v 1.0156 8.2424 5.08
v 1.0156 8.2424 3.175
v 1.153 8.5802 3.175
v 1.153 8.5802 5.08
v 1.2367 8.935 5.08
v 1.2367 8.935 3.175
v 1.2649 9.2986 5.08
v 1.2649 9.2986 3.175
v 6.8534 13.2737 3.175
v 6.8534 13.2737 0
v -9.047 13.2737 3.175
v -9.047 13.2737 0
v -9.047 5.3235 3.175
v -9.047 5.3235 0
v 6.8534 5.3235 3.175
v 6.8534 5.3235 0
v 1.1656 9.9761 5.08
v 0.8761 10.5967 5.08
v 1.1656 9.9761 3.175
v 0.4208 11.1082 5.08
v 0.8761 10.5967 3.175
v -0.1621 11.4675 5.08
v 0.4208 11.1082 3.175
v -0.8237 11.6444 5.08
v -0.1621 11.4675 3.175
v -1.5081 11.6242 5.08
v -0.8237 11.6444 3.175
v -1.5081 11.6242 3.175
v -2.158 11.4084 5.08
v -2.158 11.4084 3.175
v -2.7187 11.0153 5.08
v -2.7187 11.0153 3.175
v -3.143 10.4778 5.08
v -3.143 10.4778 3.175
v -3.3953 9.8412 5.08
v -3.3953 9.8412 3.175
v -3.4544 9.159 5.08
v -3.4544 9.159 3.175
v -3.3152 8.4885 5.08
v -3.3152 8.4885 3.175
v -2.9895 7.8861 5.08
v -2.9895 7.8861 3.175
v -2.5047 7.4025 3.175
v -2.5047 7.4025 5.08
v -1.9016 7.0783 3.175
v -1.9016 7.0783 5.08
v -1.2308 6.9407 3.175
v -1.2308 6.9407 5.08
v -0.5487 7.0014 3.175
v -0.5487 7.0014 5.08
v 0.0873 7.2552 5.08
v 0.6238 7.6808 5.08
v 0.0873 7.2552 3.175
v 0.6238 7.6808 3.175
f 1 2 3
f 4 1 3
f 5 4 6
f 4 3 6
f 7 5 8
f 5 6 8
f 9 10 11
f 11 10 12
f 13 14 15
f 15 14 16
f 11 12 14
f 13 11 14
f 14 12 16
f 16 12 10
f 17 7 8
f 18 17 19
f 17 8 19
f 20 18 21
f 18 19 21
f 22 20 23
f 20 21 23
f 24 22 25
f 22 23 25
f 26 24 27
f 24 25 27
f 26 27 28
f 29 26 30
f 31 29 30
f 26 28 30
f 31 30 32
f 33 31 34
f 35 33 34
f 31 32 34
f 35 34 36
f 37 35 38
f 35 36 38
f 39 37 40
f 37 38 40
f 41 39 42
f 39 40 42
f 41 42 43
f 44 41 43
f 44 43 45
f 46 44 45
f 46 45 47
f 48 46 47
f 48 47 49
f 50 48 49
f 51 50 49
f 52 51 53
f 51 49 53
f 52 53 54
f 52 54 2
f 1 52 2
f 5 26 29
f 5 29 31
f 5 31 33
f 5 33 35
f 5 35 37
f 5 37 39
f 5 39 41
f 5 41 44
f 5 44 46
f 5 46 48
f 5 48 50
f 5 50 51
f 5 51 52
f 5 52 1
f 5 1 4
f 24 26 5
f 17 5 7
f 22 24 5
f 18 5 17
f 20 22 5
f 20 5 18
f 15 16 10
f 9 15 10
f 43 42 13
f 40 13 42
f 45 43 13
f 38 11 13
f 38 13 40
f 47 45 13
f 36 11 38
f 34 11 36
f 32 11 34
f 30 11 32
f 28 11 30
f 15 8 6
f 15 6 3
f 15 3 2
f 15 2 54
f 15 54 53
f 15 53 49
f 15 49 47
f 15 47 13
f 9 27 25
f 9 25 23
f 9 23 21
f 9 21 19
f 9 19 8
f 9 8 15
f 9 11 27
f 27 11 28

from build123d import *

# Parameters (mm, degrees)
F1_DEPTH = 3.175
F2_DEPTH = 5.08


with BuildPart() as f1:
    # F0 (on Top) → F1 (new body)
    with BuildSketch(Plane.XY):
        with BuildLine():
            Line((6.8534065496, 13.273686968), (-9.0469934504, 13.273686968))
            Line((-9.0469934504, 13.273686968), (-3.2091541804, 10.354767333))
            ThreePointArc((-3.2091541804, 10.354767333), (-0.5541880245, 11.5971004374), (1.2648976422, 9.298586968))
            ThreePointArc((1.2648976422, 9.298586968), (1.2017200189, 8.7559815421), (1.0155672796, 8.2424066031))
            Line((1.0155672796, 8.2424066031), (6.8534065496, 5.323486968))
            Line((6.8534065496, 5.323486968), (6.8534065496, 13.273686968))
        make_face()
        with BuildLine():
            Line((-3.2091541804, 10.354767333), (-9.0469934504, 13.273686968))
            Line((-9.0469934504, 13.273686968), (-9.0469934504, 5.323486968))
            Line((-9.0469934504, 5.323486968), (6.8534065496, 5.323486968))
            Line((6.8534065496, 5.323486968), (1.0155672796, 8.2424066031))
            ThreePointArc((1.0155672796, 8.2424066031), (-2.1529738154, 7.1862262381), (-3.2091541804, 10.354767333))
        make_face()
        with BuildLine():
            ThreePointArc((1.2648976422, 9.298586968), (-0.5541880245, 11.5971004374), (-3.2091541804, 10.354767333))
            Line((-3.2091541804, 10.354767333), (1.0155672796, 8.2424066031))
            ThreePointArc((1.0155672796, 8.2424066031), (1.2017200189, 8.7559815421), (1.2648976422, 9.298586968))
        make_face()
        with BuildLine():
            Line((1.0155672796, 8.2424066031), (-3.2091541804, 10.354767333))
            ThreePointArc((-3.2091541804, 10.354767333), (-2.1529738154, 7.1862262381), (1.0155672796, 8.2424066031))
        make_face()
    extrude(amount=F1_DEPTH)

    # F0 (on Top) → F2 (join)
    with BuildSketch(Plane.XY):
        with BuildLine():
            ThreePointArc((1.2648976422, 9.298586968), (-0.5541880245, 11.5971004374), (-3.2091541804, 10.354767333))
            Line((-3.2091541804, 10.354767333), (1.0155672796, 8.2424066031))
            ThreePointArc((1.0155672796, 8.2424066031), (1.2017200189, 8.7559815421), (1.2648976422, 9.298586968))
        make_face()
        with BuildLine():
            Line((1.0155672796, 8.2424066031), (-3.2091541804, 10.354767333))
            ThreePointArc((-3.2091541804, 10.354767333), (-2.1529738154, 7.1862262381), (1.0155672796, 8.2424066031))
        make_face()
    extrude(amount=F2_DEPTH)


solid = f1.part
